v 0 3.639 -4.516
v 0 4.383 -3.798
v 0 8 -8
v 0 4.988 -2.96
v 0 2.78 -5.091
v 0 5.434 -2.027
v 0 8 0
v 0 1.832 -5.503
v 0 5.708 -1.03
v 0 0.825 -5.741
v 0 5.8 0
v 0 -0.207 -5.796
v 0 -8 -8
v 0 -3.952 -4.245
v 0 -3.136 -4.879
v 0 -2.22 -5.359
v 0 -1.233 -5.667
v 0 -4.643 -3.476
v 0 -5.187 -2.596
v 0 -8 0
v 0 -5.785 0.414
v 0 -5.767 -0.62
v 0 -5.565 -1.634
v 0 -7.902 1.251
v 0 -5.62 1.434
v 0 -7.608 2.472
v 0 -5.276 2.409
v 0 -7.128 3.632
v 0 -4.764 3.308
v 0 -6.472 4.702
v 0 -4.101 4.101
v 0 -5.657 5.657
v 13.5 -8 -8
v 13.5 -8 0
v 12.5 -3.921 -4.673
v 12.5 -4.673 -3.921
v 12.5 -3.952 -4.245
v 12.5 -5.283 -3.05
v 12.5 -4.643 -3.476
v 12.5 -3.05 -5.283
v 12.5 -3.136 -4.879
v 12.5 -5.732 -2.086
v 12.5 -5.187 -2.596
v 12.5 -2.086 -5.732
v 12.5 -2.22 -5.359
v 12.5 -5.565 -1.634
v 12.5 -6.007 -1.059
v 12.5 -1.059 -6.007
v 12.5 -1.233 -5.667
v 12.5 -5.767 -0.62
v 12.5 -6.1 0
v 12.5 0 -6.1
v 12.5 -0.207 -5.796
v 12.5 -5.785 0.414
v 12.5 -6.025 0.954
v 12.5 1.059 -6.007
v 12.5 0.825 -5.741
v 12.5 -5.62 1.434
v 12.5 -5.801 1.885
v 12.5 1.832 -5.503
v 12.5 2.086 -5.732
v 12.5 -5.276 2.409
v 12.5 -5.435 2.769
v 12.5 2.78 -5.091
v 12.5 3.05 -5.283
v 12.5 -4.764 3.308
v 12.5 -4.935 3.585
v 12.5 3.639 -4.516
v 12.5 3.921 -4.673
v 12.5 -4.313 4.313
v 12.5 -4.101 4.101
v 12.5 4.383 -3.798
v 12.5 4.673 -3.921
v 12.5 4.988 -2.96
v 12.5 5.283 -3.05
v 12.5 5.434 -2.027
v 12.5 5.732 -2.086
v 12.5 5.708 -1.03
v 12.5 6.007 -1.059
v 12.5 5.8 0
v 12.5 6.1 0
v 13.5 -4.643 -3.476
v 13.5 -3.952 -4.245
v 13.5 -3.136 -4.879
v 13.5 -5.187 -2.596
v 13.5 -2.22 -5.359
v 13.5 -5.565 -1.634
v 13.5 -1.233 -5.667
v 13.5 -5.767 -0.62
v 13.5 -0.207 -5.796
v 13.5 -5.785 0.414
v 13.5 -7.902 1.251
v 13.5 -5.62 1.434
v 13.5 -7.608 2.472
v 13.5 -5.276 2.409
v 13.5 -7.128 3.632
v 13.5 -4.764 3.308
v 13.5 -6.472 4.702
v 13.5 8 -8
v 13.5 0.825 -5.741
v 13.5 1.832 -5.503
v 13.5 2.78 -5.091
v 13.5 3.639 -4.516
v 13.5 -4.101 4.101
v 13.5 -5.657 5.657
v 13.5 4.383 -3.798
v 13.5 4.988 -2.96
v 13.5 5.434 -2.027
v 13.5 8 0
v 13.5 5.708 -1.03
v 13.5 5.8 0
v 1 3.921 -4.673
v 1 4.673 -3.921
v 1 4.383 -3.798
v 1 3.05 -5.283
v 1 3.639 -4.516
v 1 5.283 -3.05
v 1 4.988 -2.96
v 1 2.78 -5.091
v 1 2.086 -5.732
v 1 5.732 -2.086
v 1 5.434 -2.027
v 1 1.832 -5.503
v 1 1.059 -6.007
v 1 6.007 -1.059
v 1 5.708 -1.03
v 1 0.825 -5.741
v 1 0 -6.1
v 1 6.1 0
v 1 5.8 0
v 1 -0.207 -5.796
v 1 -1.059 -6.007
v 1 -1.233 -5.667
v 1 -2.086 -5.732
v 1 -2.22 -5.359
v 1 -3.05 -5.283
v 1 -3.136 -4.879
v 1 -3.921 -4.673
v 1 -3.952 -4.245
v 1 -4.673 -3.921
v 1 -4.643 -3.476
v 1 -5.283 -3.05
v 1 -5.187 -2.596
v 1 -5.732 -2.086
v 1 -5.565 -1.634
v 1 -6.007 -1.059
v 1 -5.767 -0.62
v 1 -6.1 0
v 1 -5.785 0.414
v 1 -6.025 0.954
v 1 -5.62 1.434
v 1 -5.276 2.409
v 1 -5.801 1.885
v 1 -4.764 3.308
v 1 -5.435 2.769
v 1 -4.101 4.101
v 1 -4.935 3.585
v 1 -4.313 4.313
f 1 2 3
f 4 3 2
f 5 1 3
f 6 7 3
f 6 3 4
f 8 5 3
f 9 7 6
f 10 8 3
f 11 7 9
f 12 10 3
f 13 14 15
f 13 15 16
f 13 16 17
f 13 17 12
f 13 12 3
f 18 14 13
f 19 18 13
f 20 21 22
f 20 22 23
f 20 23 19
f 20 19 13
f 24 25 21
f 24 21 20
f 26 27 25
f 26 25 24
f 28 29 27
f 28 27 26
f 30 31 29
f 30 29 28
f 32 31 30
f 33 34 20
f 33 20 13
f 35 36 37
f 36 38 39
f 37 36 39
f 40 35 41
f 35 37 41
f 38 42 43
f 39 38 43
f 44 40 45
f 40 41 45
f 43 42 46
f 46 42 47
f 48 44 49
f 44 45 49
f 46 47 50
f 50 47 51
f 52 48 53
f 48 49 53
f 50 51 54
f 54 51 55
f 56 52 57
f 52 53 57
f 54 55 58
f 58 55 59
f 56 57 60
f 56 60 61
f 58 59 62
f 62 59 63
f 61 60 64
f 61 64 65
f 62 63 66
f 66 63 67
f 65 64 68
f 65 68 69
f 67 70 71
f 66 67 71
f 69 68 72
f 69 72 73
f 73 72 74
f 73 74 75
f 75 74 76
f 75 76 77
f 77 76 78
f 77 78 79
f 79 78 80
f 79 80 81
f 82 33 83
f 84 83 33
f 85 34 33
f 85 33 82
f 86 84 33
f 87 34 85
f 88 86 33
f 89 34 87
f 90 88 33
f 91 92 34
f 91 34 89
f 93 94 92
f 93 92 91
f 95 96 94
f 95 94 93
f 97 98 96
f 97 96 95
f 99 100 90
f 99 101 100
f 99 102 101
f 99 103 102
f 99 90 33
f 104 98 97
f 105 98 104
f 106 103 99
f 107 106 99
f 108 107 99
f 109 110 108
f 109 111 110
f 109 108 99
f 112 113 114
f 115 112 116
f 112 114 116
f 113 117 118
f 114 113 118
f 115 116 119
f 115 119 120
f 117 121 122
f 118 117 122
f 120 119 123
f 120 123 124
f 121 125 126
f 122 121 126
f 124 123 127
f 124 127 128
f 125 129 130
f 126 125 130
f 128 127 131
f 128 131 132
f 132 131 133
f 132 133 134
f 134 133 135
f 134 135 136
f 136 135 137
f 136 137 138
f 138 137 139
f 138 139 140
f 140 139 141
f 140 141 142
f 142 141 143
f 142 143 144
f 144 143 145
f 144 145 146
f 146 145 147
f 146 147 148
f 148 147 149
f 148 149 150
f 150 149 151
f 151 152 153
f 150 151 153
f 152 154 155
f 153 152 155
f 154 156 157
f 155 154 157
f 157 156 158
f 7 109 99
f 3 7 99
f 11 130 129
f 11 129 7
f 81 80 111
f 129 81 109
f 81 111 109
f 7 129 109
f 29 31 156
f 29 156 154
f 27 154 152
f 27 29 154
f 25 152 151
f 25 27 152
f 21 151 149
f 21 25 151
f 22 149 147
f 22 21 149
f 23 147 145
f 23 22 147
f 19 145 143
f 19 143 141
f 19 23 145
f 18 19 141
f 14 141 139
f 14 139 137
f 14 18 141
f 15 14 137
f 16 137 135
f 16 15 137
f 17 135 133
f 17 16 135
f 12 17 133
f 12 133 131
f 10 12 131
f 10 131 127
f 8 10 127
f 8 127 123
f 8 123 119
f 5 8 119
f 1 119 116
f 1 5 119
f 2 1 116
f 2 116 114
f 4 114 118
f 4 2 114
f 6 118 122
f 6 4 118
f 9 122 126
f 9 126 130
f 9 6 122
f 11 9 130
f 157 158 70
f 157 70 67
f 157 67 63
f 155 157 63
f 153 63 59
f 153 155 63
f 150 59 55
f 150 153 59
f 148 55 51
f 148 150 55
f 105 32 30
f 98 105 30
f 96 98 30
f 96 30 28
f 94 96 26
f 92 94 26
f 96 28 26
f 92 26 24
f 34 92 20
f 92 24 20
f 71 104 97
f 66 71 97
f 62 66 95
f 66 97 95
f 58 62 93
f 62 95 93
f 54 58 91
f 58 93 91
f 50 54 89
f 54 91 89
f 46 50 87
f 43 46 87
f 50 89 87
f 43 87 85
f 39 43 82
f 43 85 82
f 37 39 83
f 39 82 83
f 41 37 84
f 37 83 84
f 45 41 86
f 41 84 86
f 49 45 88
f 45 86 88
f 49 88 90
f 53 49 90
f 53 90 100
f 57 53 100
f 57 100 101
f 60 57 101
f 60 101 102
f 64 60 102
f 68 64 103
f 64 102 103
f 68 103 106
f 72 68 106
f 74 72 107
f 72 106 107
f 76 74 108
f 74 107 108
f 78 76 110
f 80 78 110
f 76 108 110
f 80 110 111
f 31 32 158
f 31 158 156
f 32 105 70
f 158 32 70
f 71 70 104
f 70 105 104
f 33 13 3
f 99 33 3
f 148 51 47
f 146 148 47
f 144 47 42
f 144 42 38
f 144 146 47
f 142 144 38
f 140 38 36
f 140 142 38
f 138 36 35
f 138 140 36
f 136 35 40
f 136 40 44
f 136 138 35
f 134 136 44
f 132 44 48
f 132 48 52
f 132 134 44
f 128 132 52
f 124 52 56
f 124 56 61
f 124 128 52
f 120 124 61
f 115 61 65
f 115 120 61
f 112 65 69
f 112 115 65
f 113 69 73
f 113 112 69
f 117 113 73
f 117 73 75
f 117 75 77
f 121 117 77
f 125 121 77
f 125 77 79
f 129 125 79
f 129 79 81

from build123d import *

# Parameters (mm, degrees)
PAD_DEPTH    = 13.5
PAD001_DEPTH = 1
PAD008_DEPTH = 1


with BuildPart() as part:
    # Sketch → Pad (new body)
    with BuildSketch(Plane.YZ):
        with BuildLine():
            Line((-8, 0), (-8, -8))
            Line((-8, -8), (8, -8))
            Line((8, 0), (8, -8))
            Line((8, 0), (6.1, 0))
            ThreePointArc((-6.1, 0), (0, -6.1), (6.1, 0))
            ThreePointArc((-4.3133513652, 4.3133513652), (-5.6356651483, 2.3343689374), (-6.1, 0))
            Line((-5.6568542495, 5.6568542495), (-4.3133513652, 4.3133513652))
            ThreePointArc((-5.6568542495, 5.6568542495), (-7.3910362601, 3.0614674589), (-8, 0))
        make_face()
    extrude(amount=PAD_DEPTH)

    # Sketch001 → Pad001 (join)
    with BuildSketch(Plane.YZ):
        with BuildLine():
            ThreePointArc((-4.1012193309, 4.1012193309), (-2.2195639077, -5.3585012886), (5.8, 0))
            Line((5.8, 0), (6.1, 0))
            ThreePointArc((-4.3133513652, 4.3133513652), (-2.3343689374, -5.6356651483), (6.1, 0))
            Line((-4.1012193309, 4.1012193309), (-4.3133513652, 4.3133513652))
        make_face()
    extrude(amount=PAD001_DEPTH)

    # Sketch013 (on Face5 of Pad001) → Pad008 (join)
    with BuildSketch(Plane.YZ.offset(13.5)):
        with BuildLine():
            ThreePointArc((-4.3133513652, 4.3133513652), (-2.3343689374, -5.6356651483), (6.1, 0))
            Line((5.8, 0), (6.1, 0))
            ThreePointArc((-4.1012193309, 4.1012193309), (-2.2195639077, -5.3585012886), (5.8, 0))
            Line((-4.3133513652, 4.3133513652), (-4.1012193309, 4.1012193309))
        make_face()
    extrude(amount=-PAD008_DEPTH)


solid = part.part
